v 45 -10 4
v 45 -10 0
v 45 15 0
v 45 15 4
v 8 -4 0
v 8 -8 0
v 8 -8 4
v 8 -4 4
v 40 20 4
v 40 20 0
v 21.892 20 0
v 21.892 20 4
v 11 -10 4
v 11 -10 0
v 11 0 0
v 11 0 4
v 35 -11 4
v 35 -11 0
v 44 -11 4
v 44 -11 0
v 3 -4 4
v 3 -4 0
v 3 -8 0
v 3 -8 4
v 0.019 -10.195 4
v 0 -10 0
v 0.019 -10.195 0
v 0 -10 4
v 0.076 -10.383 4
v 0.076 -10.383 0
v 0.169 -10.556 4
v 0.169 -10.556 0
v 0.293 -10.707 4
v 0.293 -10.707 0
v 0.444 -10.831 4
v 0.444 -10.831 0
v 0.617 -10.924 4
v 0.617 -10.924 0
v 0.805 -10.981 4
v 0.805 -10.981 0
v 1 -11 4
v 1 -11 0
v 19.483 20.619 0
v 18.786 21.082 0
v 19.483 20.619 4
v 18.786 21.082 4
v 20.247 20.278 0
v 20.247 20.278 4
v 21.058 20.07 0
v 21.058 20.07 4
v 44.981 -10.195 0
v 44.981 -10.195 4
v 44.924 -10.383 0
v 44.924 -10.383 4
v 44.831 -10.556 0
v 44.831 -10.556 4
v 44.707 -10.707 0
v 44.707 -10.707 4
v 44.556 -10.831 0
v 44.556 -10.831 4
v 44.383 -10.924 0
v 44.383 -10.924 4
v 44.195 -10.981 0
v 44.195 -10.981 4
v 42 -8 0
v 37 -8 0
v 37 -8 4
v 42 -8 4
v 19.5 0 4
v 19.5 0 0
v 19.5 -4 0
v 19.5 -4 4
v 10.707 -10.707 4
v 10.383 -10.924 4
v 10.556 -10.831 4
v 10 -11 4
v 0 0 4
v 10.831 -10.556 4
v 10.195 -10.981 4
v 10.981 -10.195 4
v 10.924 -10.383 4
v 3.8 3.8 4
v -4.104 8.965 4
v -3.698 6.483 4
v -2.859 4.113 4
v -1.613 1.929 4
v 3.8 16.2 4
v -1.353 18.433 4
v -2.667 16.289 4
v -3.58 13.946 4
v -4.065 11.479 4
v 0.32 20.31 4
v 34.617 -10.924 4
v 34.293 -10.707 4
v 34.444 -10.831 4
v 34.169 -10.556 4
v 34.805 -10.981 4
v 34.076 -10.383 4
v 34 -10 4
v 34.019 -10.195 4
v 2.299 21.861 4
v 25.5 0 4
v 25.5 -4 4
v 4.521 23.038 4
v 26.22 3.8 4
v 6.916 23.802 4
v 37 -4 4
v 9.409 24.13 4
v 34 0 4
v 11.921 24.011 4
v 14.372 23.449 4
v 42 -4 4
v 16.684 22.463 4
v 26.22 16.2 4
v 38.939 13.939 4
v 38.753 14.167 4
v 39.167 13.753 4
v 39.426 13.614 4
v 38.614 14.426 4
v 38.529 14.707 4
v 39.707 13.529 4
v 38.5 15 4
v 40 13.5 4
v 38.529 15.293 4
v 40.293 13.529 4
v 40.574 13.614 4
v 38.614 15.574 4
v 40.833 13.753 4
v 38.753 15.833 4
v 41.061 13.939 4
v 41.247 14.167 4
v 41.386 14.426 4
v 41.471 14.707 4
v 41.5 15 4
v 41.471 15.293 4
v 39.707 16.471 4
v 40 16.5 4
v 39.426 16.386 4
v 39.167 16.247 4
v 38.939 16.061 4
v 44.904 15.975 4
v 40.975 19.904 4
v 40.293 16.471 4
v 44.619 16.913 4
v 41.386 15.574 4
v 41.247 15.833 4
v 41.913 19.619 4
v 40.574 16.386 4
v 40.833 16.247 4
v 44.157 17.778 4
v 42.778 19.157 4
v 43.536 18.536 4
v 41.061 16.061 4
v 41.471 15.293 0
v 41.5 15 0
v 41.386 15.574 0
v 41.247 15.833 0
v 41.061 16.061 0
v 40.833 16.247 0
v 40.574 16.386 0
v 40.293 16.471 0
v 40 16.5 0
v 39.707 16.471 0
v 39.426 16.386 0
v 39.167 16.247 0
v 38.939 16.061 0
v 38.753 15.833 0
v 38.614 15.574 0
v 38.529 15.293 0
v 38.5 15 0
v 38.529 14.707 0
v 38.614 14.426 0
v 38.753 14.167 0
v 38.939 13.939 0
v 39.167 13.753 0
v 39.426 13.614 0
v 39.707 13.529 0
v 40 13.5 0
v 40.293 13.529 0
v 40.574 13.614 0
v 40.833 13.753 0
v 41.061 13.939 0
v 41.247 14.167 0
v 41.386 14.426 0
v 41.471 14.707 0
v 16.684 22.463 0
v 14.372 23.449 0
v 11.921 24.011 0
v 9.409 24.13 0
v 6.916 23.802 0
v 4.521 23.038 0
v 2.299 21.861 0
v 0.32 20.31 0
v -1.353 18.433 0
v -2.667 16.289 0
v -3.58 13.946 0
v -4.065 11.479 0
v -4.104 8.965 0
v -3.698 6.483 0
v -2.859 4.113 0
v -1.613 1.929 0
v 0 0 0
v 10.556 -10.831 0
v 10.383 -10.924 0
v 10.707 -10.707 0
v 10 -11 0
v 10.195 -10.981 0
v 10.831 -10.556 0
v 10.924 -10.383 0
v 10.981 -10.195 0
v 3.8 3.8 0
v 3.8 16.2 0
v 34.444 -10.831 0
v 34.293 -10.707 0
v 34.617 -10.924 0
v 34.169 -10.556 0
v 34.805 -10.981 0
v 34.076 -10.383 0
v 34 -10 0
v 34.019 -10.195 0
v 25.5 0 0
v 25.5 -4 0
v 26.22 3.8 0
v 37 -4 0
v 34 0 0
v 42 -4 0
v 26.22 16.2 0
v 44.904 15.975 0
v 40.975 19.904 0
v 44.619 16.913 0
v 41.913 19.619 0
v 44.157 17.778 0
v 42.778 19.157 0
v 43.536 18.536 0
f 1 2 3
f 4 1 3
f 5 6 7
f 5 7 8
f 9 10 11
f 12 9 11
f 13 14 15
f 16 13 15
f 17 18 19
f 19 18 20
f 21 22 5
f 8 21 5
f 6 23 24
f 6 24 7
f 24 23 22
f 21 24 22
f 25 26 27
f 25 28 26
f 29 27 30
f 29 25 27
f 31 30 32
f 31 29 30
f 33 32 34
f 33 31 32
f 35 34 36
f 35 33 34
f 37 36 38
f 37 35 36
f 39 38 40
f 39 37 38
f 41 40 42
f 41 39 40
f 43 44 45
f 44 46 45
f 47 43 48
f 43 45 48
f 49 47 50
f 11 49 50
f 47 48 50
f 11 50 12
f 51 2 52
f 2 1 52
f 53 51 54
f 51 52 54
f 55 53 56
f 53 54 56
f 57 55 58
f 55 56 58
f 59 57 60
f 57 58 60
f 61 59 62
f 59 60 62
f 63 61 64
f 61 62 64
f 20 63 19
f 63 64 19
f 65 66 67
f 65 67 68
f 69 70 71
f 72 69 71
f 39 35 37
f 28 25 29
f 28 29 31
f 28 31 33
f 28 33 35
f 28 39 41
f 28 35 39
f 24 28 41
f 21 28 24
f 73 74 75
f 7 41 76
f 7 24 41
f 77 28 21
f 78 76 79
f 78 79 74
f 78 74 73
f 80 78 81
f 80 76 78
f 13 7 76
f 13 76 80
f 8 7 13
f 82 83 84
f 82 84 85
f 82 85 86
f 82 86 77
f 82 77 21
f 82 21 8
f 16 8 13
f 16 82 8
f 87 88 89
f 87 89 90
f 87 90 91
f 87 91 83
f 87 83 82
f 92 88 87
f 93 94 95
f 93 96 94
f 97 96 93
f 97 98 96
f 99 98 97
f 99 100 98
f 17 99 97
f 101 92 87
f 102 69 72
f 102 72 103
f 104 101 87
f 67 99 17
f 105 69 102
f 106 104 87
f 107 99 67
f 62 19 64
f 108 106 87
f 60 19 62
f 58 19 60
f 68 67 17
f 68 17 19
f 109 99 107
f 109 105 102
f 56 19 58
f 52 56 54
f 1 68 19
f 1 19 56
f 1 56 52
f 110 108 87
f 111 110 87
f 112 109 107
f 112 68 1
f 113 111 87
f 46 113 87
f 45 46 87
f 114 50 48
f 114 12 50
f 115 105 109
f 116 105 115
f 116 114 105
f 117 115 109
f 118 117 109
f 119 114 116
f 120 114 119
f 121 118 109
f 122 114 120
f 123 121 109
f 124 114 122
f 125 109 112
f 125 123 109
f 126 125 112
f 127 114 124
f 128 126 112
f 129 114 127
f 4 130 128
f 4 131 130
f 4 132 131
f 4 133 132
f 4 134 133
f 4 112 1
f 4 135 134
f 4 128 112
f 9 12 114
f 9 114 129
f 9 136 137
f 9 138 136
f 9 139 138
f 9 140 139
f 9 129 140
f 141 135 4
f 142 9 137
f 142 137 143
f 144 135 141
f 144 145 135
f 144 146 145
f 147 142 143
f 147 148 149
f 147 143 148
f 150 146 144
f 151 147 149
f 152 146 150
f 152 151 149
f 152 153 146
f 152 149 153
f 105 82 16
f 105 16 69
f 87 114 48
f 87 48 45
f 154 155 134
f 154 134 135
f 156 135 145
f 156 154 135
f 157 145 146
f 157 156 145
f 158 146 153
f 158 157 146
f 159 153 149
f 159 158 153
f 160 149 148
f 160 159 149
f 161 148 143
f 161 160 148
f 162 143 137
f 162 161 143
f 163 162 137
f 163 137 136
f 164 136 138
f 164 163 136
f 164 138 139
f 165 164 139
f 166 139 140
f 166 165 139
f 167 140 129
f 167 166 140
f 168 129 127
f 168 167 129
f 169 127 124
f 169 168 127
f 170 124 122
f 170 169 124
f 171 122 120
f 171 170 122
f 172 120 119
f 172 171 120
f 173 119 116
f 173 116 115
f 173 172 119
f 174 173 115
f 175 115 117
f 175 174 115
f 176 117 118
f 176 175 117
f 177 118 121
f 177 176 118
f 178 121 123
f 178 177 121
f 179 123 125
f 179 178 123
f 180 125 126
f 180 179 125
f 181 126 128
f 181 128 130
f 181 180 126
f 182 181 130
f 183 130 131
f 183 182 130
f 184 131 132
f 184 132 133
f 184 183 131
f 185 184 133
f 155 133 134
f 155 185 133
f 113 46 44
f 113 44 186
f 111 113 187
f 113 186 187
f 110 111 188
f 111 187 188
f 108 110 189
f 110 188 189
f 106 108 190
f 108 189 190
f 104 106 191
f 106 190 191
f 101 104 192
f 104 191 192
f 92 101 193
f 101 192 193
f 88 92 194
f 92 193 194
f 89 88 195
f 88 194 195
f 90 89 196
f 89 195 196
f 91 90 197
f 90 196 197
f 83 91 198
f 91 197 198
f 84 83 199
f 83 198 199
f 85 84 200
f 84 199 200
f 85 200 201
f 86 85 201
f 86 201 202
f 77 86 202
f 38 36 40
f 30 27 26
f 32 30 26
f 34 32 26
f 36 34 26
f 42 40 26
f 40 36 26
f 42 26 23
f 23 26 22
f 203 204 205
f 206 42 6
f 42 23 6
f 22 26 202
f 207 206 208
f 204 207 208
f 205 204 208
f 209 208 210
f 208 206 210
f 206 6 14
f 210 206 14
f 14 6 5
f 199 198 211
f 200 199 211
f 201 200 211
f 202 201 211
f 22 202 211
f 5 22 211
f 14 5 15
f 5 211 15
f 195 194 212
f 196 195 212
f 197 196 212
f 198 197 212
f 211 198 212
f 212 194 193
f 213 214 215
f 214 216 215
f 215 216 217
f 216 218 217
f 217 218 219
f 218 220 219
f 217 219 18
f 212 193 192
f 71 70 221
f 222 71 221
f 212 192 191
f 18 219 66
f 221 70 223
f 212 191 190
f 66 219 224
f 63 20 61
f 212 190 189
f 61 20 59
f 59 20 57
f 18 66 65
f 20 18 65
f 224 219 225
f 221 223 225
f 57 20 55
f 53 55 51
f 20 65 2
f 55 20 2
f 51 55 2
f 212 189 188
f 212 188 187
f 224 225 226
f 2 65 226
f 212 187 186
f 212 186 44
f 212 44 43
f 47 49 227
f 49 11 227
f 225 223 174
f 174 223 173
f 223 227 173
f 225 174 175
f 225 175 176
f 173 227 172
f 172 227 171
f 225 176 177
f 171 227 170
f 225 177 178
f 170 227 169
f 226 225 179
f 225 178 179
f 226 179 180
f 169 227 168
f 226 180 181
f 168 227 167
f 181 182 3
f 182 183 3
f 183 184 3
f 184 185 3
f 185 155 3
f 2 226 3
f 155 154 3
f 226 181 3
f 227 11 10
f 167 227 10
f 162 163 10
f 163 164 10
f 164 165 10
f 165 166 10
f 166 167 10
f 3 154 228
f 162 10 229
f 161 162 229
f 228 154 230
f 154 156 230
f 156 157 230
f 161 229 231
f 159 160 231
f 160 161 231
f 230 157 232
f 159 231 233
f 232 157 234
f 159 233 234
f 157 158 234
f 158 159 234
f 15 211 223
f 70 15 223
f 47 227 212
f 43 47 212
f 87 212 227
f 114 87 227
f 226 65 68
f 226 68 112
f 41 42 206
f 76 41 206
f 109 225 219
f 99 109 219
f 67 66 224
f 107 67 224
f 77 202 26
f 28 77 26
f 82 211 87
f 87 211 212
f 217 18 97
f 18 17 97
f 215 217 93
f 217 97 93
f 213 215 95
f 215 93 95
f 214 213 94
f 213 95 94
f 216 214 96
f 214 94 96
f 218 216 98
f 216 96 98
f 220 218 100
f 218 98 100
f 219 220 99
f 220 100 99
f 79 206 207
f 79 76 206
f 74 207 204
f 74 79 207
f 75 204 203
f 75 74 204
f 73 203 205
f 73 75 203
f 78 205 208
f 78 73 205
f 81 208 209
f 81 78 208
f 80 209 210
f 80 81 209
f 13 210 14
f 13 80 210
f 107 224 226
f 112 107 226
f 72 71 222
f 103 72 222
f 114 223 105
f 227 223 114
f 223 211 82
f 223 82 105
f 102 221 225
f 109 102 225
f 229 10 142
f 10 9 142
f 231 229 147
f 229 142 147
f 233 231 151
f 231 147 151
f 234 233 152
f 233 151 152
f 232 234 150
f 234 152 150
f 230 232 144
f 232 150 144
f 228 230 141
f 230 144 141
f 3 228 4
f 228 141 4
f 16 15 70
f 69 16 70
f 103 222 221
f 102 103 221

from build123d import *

# Parameters (mm, degrees)
SKETCH1_W           = 22.42
SKETCH1_H           = 12.4
SKETCH1_W_2         = 5
SKETCH1_H_2         = 4
SKETCH1_R           = 1.5
BOSS_EXTRUDE2_DEPTH = 4
FILLET2_R           = 1
FILLET1_R           = 5


with BuildPart() as part:
    # Sketch1 → Boss-Extrude2 (new body)
    with BuildSketch(Plane.XY):
        with BuildLine():
            Line((0, 0), (0, -11))
            Line((0, -11), (11, -11))
            Line((11, -11), (11, 0))
            Line((11, 0), (19.5, 0))
            Line((19.5, 0), (19.5, -4))
            Line((19.5, -4), (25.5, -4))
            Line((25.5, -4), (25.5, 0))
            Line((25.5, 0), (34, 0))
            Line((34, 0), (34, -11))
            Line((34, -11), (45, -11))
            Line((45, -11), (45, 20))
            Line((45, 20), (20, 20))
            ThreePointArc((20, 20), (0, 20), (0, 0))
        make_face()
        with Locations((15.01, 10)):
            Rectangle(SKETCH1_W, SKETCH1_H, mode=Mode.SUBTRACT)
        with Locations((5.5, -6)):
            Rectangle(SKETCH1_W_2, SKETCH1_H_2, mode=Mode.SUBTRACT)
        with Locations((40, 15)):
            Circle(SKETCH1_R, mode=Mode.SUBTRACT)
        with Locations((39.5, -6)):
            Rectangle(SKETCH1_W_2, SKETCH1_H_2, mode=Mode.SUBTRACT)
    extrude(amount=BOSS_EXTRUDE2_DEPTH)

    # Fillet2
    fillet2_edges = [part.edges().sort_by_distance(p)[0] for p in [
        (45, -11, 2),
        (34, -11, 2),
        (11, -11, 2),
        (0, -11, 2),
    ]]
    fillet(fillet2_edges, radius=FILLET2_R)

    # Fillet1
    fillet1_edges = [part.edges().sort_by_distance(p)[0] for p in [
        (45, 20, 2),
        (20, 20, 2),
    ]]
    fillet(fillet1_edges, radius=FILLET1_R)


solid = part.part
